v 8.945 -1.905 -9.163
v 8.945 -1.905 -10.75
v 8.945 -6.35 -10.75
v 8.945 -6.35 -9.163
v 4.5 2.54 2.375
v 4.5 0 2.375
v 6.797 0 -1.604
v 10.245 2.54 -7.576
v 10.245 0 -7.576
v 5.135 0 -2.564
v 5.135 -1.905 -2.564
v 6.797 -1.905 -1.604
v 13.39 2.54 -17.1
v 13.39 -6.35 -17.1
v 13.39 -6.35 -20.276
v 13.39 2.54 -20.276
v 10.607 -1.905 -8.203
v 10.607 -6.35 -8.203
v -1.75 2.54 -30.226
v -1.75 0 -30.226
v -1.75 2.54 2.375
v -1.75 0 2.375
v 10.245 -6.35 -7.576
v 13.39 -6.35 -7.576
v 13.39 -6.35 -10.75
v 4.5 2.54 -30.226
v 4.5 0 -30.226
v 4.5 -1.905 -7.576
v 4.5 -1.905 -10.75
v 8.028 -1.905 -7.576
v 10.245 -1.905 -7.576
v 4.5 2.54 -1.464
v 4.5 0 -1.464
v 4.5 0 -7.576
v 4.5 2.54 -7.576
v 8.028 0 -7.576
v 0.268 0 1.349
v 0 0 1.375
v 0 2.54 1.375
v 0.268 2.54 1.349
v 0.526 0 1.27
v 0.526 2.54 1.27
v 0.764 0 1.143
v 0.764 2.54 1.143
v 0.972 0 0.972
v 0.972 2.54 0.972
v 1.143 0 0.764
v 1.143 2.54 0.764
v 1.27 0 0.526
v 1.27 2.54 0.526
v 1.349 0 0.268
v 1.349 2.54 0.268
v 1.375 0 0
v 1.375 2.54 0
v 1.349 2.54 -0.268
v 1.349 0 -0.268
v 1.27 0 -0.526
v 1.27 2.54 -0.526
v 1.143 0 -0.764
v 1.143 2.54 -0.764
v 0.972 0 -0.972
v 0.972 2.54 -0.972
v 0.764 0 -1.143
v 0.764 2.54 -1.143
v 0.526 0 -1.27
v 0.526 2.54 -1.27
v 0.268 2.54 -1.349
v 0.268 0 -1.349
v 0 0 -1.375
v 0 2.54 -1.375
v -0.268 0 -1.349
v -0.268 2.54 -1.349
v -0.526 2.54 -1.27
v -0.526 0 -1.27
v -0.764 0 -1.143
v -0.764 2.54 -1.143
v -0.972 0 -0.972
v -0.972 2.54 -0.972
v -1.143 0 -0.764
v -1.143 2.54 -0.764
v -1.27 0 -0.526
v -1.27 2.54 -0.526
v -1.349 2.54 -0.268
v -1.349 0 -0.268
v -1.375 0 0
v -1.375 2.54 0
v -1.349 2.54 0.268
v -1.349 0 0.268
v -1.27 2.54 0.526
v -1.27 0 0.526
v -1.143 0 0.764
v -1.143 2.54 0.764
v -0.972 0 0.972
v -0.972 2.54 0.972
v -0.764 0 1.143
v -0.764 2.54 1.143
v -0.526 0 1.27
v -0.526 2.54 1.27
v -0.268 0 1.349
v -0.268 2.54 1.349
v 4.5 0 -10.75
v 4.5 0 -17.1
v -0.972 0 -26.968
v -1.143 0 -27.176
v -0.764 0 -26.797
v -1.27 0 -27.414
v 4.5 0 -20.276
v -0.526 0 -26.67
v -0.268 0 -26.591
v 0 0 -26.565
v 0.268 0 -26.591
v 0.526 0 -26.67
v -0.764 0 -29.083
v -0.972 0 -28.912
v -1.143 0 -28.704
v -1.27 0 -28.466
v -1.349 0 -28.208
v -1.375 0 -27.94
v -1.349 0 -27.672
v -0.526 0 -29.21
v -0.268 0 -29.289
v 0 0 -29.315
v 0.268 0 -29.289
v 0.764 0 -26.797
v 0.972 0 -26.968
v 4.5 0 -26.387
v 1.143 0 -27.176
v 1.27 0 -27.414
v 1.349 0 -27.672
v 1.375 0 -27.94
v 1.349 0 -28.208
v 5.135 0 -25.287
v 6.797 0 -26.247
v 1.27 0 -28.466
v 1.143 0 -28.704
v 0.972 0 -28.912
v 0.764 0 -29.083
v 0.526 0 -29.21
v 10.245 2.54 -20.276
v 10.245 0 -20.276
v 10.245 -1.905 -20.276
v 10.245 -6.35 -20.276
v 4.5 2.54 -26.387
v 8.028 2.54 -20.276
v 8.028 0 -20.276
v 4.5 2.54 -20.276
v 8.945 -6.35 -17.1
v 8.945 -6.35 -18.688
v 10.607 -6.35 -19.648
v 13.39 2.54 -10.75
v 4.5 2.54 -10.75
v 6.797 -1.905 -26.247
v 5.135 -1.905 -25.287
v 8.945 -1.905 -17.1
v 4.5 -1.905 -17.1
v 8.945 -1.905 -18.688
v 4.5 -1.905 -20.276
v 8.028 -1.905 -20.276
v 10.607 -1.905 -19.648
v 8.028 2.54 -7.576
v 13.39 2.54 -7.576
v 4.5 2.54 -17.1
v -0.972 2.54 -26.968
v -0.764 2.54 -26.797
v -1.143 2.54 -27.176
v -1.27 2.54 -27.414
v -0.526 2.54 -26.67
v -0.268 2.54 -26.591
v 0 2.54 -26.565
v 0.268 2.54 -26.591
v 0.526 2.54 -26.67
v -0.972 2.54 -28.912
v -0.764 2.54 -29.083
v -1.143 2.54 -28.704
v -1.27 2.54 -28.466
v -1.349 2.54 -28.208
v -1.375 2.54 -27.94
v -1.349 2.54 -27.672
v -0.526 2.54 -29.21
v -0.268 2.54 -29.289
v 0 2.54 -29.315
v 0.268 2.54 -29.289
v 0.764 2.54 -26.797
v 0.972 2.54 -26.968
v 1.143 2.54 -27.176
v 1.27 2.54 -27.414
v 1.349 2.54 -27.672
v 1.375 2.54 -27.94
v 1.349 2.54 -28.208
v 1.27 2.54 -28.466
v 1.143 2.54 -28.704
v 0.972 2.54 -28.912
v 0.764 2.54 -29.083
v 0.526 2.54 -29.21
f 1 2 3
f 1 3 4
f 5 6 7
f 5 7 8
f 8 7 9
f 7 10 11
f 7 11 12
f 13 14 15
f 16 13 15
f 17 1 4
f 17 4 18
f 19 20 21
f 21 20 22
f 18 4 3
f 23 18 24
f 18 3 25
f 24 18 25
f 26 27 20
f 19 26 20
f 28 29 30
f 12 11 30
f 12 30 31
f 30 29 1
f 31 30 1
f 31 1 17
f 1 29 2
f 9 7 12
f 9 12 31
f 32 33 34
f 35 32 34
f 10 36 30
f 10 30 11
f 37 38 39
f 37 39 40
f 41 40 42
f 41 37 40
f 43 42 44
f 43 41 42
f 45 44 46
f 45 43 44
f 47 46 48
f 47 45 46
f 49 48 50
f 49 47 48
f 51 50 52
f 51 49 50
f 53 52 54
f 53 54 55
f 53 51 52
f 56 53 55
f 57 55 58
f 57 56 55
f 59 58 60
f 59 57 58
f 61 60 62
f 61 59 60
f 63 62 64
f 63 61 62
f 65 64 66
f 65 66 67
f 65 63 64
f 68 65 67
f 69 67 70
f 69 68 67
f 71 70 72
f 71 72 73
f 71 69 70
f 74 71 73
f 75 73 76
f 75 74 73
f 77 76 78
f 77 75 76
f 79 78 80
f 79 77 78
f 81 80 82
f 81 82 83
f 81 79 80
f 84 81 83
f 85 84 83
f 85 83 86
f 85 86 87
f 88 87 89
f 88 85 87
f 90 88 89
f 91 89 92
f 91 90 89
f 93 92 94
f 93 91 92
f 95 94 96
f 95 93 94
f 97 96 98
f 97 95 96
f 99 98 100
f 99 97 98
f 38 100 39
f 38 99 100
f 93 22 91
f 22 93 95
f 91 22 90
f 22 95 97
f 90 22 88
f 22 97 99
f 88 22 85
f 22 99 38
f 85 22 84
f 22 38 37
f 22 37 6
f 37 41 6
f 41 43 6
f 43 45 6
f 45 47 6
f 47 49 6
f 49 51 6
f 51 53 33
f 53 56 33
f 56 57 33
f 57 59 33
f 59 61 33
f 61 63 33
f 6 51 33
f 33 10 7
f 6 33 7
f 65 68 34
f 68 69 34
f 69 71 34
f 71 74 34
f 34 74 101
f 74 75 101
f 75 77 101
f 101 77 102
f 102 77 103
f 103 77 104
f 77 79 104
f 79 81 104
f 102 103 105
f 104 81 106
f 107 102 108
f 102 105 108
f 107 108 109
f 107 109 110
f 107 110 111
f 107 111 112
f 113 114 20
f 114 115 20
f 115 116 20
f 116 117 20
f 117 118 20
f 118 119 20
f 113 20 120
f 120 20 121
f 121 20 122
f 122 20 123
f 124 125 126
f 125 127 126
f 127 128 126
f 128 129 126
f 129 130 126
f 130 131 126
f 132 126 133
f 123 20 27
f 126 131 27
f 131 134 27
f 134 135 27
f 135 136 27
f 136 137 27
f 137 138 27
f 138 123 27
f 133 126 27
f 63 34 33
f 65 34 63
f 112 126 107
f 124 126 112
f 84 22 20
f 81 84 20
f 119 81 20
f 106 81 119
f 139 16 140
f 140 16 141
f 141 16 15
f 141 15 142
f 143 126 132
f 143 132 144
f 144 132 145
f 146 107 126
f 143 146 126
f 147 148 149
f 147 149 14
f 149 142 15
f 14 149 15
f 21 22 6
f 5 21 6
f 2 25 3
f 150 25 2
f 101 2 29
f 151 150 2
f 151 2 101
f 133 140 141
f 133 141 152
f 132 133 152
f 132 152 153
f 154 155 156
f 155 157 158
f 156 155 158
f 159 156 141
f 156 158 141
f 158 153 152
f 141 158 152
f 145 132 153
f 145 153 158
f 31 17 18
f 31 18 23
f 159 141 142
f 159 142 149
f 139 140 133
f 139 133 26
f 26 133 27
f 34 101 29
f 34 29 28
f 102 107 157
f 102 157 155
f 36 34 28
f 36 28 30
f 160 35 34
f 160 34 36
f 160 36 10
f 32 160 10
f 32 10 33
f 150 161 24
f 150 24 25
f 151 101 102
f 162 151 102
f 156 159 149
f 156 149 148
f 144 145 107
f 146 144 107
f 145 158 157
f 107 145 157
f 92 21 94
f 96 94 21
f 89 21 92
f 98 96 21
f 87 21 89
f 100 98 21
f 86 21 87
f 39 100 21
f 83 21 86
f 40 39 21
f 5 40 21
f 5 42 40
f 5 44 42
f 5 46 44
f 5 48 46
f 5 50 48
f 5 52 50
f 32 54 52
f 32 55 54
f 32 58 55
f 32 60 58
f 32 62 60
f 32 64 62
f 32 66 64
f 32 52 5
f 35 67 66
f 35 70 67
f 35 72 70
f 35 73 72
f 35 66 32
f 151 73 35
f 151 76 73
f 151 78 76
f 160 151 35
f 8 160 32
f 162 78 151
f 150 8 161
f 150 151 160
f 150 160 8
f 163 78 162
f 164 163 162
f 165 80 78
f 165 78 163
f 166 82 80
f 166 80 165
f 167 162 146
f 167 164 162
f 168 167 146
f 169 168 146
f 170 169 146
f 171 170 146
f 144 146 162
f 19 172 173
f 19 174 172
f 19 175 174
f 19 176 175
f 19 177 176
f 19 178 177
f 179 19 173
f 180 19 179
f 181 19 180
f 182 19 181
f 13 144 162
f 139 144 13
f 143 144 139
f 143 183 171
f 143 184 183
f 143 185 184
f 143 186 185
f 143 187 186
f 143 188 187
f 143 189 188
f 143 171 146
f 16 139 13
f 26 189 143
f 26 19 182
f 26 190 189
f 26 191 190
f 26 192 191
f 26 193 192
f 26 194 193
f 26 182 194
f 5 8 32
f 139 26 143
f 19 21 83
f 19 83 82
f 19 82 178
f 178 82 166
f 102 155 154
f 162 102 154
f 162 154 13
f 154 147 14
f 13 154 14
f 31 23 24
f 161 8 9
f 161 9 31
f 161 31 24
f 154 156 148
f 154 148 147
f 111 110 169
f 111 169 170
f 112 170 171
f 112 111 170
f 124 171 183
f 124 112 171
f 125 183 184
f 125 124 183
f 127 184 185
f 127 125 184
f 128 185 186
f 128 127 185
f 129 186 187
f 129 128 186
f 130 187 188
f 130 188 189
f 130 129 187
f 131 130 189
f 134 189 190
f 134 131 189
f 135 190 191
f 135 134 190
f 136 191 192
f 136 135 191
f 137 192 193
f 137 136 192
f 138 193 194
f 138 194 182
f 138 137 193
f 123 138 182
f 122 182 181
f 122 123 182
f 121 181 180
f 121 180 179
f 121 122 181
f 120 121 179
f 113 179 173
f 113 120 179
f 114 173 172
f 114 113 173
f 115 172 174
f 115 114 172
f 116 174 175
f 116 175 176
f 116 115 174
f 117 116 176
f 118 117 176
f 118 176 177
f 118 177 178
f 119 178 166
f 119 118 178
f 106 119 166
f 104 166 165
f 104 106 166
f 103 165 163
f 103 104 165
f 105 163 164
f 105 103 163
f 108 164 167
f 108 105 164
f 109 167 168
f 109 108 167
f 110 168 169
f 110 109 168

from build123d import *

# Parameters (mm, degrees)
SKETCH1_R           = 1.375
BOSS_EXTRUDE1_DEPTH = 2.54
BOSS_EXTRUDE3_DEPTH = 1.905
BOSS_EXTRUDE4_DEPTH = 6.35


with BuildPart() as part:
    # Sketch1 → Boss-Extrude1 (new body)
    with BuildSketch(Plane(origin=(0, 0, 0), x_dir=(1, 0, 0), z_dir=(0, 1, 0))):
        Polygon((4.5, 10.7505), (4.5, 17.1005), (13.39, 17.1005), (13.39, 20.2755), (10.244923854, 20.2755), (4.5, 30.226), (-1.75, 30.226), (-1.75, -2.375), (4.5, -2.375), (10.244923854, 7.5755), (13.39, 7.5755), (13.39, 10.7505), align=None)
        Polygon((4.5, 20.2755), (4.5, 26.38696584), (8.028456448, 20.2755), align=None, mode=Mode.SUBTRACT)
        Polygon((4.5, 7.5755), (8.028456448, 7.5755), (4.5, 1.46403416), align=None, mode=Mode.SUBTRACT)
        with Locations((0, 27.94)):
            Circle(SKETCH1_R, mode=Mode.SUBTRACT)
        Circle(SKETCH1_R, mode=Mode.SUBTRACT)
    extrude(amount=BOSS_EXTRUDE1_DEPTH)

    # Sketch1<3> → Boss-Extrude3 (add)
    with BuildSketch(Plane(origin=(0, 0, 0), x_dir=(1, 0, 0), z_dir=(0, 1, 0))):
        Polygon((10.244923854, 20.2755), (6.797350554, 26.246872117), (5.135, 25.287113577), (8.028456448, 20.2755), (4.5, 20.2755), (4.5, 17.1005), (13.39, 17.1005), (13.39, 20.2755), align=None)
        Polygon((4.5, 10.7505), (4.5, 7.5755), (8.028456448, 7.5755), (5.135, 2.563886423), (6.797350554, 1.604127883), (10.244923854, 7.5755), (13.39, 7.5755), (13.39, 10.7505), align=None)
    extrude(amount=-BOSS_EXTRUDE3_DEPTH)

    # Sketch1<4> → Boss-Extrude4 (add)
    with BuildSketch(Plane(origin=(0, 0, 0), x_dir=(1, 0, 0), z_dir=(0, 1, 0))):
        Polygon((13.39, 20.2755), (10.244923854, 20.2755), (10.607350554, 19.64775854), (8.945, 18.688), (8.945, 17.1005), (13.39, 17.1005), align=None)
        Polygon((13.39, 10.7505), (8.945, 10.7505), (8.945, 9.163), (10.607350554, 8.20324146), (10.244923854, 7.5755), (13.39, 7.5755), align=None)
    extrude(amount=-BOSS_EXTRUDE4_DEPTH)


solid = part.part
